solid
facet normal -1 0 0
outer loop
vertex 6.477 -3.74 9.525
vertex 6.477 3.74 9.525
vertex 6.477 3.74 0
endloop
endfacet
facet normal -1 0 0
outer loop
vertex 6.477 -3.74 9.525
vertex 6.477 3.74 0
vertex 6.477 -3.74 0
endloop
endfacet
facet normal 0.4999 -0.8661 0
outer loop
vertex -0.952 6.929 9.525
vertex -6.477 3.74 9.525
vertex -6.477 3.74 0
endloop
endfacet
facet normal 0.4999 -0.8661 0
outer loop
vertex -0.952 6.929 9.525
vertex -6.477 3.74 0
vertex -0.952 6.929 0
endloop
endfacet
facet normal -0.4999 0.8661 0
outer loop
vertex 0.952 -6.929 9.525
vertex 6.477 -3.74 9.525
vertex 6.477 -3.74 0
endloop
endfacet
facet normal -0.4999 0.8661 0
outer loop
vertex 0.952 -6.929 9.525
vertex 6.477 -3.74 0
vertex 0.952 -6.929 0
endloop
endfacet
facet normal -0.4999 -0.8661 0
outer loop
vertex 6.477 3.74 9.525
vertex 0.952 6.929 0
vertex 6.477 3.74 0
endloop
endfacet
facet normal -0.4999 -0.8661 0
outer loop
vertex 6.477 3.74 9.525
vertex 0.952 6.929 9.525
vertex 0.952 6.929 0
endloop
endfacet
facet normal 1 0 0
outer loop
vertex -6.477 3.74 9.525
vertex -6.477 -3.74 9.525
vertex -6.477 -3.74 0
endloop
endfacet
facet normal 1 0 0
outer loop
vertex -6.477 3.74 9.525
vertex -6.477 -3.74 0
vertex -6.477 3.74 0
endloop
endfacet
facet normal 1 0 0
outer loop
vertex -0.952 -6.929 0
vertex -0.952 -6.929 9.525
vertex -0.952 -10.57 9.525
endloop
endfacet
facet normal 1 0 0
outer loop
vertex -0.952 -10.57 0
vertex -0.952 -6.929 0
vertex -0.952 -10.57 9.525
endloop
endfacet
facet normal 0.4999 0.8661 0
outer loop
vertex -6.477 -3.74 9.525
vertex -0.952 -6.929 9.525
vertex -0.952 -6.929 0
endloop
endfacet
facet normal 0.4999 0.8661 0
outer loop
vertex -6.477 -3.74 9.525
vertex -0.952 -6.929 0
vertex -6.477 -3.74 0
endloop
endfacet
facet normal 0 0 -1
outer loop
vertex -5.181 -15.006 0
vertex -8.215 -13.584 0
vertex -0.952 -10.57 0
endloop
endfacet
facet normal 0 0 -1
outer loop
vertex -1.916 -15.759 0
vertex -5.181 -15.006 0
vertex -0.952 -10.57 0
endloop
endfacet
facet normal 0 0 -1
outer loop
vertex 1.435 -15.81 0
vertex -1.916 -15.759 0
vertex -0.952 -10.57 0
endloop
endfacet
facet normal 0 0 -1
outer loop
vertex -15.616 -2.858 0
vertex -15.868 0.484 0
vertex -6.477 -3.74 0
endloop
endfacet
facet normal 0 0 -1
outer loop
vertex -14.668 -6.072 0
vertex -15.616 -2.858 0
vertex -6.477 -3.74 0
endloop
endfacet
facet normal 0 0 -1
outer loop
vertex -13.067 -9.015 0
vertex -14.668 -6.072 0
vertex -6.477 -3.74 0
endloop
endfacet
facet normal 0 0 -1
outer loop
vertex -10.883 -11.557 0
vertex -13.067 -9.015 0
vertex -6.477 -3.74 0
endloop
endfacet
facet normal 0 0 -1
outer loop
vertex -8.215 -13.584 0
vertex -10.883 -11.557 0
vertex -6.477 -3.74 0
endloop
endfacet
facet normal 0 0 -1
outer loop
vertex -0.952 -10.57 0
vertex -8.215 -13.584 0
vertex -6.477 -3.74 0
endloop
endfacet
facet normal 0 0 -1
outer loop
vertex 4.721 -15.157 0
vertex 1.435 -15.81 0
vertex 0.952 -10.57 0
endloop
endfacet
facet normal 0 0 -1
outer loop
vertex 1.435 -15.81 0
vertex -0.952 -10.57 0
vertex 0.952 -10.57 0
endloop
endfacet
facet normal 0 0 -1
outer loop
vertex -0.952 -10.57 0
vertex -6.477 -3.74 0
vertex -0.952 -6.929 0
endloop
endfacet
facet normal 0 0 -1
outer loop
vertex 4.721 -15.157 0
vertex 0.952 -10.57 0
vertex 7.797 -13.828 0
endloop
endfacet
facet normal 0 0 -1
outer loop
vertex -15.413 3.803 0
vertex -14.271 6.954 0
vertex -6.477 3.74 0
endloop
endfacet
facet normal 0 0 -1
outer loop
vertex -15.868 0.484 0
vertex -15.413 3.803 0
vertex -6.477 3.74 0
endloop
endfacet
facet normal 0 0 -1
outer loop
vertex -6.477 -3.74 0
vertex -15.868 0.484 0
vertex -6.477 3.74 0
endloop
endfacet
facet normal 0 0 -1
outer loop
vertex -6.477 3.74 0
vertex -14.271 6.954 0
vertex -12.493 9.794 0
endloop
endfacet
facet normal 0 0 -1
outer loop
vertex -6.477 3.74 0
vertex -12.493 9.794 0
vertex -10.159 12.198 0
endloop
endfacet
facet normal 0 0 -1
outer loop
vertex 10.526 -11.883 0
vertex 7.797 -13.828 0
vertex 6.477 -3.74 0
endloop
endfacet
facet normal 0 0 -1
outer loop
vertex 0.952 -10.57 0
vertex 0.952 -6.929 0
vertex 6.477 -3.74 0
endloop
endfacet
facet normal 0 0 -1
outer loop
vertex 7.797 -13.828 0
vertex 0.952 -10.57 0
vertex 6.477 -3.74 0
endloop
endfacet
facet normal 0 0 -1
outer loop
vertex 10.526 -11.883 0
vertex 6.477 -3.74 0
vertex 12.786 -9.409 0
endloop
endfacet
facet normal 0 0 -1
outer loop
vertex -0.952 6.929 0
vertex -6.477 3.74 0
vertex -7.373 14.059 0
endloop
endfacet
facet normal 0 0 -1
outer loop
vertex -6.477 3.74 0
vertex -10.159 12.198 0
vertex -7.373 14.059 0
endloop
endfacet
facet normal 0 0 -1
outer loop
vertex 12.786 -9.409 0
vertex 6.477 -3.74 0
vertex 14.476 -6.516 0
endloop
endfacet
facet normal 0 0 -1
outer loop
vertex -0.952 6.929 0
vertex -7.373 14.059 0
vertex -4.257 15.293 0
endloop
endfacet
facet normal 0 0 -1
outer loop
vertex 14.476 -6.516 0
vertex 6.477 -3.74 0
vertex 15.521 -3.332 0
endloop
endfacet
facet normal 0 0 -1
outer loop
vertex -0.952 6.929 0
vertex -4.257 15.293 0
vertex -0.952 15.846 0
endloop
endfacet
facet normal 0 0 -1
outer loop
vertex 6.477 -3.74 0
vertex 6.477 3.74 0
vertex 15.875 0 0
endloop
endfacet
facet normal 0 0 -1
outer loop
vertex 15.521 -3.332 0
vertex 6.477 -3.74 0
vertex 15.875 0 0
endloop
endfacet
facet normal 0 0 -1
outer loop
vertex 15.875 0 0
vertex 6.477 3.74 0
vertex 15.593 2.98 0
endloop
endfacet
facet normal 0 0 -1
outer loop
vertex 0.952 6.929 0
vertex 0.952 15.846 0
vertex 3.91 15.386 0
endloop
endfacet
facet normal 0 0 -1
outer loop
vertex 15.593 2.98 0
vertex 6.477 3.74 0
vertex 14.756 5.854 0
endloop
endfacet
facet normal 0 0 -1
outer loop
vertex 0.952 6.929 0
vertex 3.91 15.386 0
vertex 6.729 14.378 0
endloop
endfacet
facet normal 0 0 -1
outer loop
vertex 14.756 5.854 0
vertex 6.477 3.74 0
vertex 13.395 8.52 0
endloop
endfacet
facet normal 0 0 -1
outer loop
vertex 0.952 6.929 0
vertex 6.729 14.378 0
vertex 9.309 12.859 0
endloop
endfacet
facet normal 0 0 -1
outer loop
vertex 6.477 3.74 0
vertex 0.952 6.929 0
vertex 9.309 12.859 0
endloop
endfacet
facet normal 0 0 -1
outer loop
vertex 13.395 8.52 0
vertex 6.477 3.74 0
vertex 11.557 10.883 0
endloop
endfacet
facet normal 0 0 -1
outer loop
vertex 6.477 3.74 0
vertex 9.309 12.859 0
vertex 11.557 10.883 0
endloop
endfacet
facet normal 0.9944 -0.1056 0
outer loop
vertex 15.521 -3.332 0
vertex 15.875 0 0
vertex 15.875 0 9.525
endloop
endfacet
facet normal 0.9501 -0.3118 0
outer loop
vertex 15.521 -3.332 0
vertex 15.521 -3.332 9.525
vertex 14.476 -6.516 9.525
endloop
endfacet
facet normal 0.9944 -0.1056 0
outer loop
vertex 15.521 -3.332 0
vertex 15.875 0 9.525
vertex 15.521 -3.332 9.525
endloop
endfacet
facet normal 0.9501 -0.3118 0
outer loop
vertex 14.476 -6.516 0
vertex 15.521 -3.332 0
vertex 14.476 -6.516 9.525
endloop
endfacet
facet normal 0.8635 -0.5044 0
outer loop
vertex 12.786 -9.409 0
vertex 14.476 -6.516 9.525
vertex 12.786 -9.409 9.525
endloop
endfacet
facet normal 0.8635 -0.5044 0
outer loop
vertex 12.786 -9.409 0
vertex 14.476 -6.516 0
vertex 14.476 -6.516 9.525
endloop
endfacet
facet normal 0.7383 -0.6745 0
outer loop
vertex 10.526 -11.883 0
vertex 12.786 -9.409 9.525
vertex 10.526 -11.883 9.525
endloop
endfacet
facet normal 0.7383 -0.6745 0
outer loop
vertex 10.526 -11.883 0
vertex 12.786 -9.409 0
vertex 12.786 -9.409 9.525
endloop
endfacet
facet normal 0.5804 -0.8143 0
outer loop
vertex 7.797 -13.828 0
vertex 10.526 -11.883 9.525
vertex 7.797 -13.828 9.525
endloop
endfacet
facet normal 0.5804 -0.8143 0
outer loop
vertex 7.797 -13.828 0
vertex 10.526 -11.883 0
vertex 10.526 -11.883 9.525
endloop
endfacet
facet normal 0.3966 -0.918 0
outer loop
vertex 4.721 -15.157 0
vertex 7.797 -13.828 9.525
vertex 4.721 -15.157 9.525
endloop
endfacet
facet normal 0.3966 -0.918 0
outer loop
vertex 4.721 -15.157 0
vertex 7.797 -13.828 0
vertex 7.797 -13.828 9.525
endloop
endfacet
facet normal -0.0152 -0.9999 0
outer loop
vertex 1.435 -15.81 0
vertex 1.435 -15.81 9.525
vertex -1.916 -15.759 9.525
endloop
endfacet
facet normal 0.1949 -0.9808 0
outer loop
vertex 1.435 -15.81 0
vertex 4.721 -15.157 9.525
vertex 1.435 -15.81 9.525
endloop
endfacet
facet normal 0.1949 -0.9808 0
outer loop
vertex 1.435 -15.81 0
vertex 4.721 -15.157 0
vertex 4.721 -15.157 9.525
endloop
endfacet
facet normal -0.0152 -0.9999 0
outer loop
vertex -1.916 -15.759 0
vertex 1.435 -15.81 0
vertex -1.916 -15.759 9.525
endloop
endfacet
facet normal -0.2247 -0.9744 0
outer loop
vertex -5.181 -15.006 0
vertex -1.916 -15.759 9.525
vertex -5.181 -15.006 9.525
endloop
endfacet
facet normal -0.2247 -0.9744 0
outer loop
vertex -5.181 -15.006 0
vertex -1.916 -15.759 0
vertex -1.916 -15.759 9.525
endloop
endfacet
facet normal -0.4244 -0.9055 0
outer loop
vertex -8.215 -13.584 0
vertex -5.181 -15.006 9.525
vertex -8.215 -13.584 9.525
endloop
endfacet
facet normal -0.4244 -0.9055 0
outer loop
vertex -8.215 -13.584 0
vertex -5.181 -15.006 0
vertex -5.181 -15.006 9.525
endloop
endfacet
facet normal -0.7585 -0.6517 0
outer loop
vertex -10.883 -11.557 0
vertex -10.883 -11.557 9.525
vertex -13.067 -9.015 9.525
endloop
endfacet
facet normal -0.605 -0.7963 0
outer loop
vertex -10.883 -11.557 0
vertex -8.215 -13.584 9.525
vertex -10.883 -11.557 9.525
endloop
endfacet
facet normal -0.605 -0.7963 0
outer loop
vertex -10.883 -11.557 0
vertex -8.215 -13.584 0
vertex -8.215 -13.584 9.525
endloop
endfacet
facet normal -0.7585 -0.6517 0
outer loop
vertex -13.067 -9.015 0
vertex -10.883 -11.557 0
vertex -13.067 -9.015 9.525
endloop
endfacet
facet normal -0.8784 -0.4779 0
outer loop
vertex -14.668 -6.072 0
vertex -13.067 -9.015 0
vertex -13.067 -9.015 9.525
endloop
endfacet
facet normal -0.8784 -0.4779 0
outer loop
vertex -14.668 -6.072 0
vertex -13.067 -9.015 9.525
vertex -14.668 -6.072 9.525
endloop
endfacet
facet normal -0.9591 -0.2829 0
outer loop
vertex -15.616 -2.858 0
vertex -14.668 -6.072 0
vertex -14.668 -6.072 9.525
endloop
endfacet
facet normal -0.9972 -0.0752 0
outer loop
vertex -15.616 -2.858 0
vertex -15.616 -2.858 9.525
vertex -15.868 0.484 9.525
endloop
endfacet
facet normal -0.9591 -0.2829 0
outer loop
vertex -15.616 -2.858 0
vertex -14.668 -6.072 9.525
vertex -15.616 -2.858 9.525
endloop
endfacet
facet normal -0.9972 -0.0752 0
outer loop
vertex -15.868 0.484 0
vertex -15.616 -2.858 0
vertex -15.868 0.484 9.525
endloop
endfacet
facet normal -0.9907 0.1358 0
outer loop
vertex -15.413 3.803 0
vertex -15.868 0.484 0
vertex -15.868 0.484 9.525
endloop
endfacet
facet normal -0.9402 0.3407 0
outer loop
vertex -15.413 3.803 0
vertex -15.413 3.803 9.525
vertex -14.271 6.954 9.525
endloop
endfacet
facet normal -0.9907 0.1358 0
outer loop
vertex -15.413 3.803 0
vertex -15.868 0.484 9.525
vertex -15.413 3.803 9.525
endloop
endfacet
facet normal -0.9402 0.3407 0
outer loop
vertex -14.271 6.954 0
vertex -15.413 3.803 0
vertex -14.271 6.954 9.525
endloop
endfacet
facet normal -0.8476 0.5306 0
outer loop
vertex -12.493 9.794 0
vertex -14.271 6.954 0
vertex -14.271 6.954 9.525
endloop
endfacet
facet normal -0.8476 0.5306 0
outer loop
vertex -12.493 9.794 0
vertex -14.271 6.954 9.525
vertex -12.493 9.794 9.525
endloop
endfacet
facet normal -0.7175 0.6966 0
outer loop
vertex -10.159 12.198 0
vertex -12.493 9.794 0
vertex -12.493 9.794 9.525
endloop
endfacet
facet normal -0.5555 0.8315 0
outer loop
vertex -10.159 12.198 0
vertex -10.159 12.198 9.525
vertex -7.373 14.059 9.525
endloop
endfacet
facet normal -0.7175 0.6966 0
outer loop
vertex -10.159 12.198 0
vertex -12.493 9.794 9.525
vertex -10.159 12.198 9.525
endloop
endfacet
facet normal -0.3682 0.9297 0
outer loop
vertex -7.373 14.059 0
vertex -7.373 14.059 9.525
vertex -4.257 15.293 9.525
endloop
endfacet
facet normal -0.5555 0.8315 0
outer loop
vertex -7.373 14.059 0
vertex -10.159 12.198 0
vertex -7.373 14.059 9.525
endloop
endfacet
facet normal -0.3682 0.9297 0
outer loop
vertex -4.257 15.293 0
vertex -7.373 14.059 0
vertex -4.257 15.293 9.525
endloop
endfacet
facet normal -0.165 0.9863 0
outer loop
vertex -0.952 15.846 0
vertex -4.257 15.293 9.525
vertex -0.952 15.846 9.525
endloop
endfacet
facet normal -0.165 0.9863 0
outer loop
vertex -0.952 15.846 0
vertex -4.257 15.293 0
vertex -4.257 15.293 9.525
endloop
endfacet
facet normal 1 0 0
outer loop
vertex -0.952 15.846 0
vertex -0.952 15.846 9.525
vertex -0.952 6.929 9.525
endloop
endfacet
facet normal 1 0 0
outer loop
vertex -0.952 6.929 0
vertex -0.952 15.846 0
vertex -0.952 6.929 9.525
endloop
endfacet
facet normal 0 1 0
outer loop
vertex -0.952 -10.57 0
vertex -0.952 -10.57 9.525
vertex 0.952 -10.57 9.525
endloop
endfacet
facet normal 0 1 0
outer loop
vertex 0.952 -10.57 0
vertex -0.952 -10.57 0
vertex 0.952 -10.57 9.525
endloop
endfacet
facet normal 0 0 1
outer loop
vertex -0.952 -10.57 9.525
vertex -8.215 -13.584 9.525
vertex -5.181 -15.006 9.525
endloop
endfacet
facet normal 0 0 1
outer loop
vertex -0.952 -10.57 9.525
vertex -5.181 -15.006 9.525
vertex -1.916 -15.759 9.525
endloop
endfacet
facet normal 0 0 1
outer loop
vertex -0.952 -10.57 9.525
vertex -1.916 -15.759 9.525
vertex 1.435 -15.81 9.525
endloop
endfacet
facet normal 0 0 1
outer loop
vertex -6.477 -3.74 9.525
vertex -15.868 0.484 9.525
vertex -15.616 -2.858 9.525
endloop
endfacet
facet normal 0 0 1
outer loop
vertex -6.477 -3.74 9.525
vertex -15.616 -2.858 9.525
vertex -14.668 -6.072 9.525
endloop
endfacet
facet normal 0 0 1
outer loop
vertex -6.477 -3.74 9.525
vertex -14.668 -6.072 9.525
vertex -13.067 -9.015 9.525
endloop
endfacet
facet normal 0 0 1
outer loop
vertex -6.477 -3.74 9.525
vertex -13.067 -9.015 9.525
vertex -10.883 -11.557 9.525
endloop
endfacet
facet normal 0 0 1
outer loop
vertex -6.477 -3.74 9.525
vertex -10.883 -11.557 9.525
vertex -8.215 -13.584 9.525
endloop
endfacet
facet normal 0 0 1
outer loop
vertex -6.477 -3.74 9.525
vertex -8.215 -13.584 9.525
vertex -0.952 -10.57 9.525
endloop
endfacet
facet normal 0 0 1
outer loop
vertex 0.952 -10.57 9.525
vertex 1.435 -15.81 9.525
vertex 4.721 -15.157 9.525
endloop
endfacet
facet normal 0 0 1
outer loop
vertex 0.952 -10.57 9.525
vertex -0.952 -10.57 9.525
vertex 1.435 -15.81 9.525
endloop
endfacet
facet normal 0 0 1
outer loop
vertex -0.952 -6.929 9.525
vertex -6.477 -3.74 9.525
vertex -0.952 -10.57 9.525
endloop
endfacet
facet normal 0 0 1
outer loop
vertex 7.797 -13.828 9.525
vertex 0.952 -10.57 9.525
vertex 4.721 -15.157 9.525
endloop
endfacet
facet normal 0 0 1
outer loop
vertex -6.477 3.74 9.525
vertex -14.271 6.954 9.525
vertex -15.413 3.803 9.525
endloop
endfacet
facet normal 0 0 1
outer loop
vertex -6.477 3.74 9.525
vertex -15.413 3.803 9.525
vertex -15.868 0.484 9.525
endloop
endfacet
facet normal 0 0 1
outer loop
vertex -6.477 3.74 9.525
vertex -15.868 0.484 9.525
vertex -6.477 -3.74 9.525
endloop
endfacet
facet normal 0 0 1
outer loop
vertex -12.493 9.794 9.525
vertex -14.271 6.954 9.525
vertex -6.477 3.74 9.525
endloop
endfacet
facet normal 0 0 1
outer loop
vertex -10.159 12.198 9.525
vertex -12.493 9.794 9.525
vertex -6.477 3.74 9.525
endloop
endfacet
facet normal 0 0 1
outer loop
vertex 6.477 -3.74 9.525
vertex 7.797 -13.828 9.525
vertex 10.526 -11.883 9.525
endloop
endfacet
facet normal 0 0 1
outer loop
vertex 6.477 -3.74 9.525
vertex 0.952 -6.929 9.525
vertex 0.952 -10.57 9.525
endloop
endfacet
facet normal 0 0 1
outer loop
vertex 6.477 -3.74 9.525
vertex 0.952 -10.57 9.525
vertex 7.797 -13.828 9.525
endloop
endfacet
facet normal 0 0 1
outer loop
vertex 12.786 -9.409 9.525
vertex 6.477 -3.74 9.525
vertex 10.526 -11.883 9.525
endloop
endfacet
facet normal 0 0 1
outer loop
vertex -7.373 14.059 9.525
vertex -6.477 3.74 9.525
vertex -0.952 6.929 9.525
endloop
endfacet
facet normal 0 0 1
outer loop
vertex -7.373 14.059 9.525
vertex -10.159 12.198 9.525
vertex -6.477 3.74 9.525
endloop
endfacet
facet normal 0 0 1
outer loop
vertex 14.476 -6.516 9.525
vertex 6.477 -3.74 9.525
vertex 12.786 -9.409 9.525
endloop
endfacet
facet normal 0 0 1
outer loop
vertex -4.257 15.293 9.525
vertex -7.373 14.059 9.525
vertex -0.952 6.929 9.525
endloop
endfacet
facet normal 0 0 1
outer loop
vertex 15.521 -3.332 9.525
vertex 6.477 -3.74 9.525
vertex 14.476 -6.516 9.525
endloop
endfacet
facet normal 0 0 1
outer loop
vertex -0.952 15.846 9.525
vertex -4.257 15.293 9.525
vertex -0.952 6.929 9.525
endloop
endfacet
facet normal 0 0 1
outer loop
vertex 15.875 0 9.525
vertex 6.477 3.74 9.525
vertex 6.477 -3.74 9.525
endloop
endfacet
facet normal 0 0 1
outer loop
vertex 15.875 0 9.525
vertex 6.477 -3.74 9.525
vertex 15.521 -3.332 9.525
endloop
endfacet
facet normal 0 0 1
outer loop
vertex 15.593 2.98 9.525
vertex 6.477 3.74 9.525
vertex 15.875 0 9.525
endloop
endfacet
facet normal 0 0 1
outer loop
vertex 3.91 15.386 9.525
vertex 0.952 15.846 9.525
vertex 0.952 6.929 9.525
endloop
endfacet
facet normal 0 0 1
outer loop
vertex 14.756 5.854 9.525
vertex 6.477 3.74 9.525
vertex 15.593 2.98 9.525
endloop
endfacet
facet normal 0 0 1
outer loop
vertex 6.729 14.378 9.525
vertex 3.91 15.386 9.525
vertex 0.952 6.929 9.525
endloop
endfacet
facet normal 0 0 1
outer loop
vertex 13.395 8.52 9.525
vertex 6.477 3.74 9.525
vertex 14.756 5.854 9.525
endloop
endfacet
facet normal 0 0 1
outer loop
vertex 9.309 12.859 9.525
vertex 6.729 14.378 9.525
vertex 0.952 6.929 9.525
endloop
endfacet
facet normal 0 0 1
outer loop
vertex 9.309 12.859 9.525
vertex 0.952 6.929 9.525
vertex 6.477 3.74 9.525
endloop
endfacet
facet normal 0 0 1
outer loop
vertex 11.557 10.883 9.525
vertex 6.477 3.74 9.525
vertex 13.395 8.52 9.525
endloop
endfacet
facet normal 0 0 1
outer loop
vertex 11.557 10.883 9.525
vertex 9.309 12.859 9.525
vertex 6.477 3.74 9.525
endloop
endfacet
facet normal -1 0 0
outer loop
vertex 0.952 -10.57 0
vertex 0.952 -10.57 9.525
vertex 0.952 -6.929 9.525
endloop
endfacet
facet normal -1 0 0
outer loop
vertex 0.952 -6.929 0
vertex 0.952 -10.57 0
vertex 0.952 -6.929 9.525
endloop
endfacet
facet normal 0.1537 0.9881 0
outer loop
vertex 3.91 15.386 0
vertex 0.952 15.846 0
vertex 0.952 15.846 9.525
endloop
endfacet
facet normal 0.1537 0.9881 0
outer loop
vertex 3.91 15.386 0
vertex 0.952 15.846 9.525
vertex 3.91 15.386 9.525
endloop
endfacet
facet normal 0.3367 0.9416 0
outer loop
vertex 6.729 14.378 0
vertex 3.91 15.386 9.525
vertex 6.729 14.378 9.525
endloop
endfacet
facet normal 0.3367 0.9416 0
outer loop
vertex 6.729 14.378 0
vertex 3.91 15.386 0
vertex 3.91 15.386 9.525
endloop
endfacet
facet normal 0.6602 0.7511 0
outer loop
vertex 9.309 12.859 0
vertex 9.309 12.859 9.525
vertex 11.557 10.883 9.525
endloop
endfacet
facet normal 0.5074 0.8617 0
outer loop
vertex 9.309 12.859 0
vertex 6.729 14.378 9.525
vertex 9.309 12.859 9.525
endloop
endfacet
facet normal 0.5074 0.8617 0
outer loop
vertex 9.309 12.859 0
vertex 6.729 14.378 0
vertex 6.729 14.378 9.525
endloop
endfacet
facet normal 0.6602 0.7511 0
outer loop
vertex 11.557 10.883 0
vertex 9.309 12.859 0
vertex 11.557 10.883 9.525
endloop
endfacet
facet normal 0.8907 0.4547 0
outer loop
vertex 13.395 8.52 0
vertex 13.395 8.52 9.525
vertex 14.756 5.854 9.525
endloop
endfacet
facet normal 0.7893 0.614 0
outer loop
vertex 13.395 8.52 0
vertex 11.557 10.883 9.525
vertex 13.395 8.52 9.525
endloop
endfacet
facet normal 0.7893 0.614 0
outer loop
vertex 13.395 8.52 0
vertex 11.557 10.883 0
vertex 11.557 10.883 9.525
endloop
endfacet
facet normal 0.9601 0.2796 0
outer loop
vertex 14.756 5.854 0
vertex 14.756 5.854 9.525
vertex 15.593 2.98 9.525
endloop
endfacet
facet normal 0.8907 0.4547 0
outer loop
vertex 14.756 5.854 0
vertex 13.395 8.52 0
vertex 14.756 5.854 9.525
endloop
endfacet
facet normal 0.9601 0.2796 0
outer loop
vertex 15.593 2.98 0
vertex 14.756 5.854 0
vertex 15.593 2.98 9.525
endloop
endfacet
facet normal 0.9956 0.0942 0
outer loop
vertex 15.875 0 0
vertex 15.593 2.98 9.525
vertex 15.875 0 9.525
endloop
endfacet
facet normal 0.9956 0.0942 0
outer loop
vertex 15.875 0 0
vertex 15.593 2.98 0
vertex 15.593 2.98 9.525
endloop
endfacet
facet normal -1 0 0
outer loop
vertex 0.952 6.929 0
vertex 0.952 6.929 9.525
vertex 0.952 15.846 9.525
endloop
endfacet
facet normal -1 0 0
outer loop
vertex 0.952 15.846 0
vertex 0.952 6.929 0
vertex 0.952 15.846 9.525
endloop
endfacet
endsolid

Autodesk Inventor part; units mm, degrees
ref_plane "YZ Plane" through (0, 0, 0) normal (1, 0, 0) x (0, 1, 0)
ref_plane "XZ Plane" through (0, 0, 0) normal (0, 1, 0) x (-1, 0, 0)
ref_plane "XY Plane" through (0, 0, 0) normal (0, 0, 1) x (1, 0, 0)
sketch "Sketch1" plane through (0, 0, 0) normal (0, 0, 1) x (1, 0, 0)
  circle A0 centre (0, 0) radius 15.875
  dimension "d0" = 31.75
extrude "Extrusion1" add sketch "Sketch1" along normal blind 9.525
sketch "Sketch2" plane through (0, 0, 9.525) normal (0, 0, 1) x (1, 0, 0)
  line L0 (-6.477, -3.7395) -> (-6.477, 3.7395)
  line L1 (-6.477, 3.7395) -> (0, 7.479)
  line L2 (0, 7.479) -> (6.477, 3.7395)
  line L3 (6.477, 3.7395) -> (6.477, -3.7395)
  line L4 (6.477, -3.7395) -> (0, -7.479)
  line L5 (0, -7.479) -> (-6.477, -3.7395)
  circle A0 centre (0, 0) radius 15.875 projected
  line L6 (-0.9525, 15.8464) -> (-0.9525, -10.5696)
  line L7 (-0.9525, -10.5696) -> (0.9525, -10.5696)
  line L8 (0.9525, -10.5696) -> (0.9525, 15.8464)
  arc A1 (0.9525, 15.8464) -> (-0.9525, 15.8464) centre (0, 0) ccw
  point P0 (-6.477, 0)
  dimension "d3" = 12.954
  dimension "d4" = 1.905
  dimension "d5" = 0.9525
  dimension "d6" = 26.416
extrude "Extrusion2" cut sketch "Sketch2" against normal blind 9.525 contours L0 L1 L6 L5 | L6 L1 L2 L8 L4 L5 | L5 L4 L8 L7 L6 | L6 A0 L8 L2 L1 | L8 L2 L3 L4
equation "\"d5\" = 0.5 * d4"
properties part number "Collar"
